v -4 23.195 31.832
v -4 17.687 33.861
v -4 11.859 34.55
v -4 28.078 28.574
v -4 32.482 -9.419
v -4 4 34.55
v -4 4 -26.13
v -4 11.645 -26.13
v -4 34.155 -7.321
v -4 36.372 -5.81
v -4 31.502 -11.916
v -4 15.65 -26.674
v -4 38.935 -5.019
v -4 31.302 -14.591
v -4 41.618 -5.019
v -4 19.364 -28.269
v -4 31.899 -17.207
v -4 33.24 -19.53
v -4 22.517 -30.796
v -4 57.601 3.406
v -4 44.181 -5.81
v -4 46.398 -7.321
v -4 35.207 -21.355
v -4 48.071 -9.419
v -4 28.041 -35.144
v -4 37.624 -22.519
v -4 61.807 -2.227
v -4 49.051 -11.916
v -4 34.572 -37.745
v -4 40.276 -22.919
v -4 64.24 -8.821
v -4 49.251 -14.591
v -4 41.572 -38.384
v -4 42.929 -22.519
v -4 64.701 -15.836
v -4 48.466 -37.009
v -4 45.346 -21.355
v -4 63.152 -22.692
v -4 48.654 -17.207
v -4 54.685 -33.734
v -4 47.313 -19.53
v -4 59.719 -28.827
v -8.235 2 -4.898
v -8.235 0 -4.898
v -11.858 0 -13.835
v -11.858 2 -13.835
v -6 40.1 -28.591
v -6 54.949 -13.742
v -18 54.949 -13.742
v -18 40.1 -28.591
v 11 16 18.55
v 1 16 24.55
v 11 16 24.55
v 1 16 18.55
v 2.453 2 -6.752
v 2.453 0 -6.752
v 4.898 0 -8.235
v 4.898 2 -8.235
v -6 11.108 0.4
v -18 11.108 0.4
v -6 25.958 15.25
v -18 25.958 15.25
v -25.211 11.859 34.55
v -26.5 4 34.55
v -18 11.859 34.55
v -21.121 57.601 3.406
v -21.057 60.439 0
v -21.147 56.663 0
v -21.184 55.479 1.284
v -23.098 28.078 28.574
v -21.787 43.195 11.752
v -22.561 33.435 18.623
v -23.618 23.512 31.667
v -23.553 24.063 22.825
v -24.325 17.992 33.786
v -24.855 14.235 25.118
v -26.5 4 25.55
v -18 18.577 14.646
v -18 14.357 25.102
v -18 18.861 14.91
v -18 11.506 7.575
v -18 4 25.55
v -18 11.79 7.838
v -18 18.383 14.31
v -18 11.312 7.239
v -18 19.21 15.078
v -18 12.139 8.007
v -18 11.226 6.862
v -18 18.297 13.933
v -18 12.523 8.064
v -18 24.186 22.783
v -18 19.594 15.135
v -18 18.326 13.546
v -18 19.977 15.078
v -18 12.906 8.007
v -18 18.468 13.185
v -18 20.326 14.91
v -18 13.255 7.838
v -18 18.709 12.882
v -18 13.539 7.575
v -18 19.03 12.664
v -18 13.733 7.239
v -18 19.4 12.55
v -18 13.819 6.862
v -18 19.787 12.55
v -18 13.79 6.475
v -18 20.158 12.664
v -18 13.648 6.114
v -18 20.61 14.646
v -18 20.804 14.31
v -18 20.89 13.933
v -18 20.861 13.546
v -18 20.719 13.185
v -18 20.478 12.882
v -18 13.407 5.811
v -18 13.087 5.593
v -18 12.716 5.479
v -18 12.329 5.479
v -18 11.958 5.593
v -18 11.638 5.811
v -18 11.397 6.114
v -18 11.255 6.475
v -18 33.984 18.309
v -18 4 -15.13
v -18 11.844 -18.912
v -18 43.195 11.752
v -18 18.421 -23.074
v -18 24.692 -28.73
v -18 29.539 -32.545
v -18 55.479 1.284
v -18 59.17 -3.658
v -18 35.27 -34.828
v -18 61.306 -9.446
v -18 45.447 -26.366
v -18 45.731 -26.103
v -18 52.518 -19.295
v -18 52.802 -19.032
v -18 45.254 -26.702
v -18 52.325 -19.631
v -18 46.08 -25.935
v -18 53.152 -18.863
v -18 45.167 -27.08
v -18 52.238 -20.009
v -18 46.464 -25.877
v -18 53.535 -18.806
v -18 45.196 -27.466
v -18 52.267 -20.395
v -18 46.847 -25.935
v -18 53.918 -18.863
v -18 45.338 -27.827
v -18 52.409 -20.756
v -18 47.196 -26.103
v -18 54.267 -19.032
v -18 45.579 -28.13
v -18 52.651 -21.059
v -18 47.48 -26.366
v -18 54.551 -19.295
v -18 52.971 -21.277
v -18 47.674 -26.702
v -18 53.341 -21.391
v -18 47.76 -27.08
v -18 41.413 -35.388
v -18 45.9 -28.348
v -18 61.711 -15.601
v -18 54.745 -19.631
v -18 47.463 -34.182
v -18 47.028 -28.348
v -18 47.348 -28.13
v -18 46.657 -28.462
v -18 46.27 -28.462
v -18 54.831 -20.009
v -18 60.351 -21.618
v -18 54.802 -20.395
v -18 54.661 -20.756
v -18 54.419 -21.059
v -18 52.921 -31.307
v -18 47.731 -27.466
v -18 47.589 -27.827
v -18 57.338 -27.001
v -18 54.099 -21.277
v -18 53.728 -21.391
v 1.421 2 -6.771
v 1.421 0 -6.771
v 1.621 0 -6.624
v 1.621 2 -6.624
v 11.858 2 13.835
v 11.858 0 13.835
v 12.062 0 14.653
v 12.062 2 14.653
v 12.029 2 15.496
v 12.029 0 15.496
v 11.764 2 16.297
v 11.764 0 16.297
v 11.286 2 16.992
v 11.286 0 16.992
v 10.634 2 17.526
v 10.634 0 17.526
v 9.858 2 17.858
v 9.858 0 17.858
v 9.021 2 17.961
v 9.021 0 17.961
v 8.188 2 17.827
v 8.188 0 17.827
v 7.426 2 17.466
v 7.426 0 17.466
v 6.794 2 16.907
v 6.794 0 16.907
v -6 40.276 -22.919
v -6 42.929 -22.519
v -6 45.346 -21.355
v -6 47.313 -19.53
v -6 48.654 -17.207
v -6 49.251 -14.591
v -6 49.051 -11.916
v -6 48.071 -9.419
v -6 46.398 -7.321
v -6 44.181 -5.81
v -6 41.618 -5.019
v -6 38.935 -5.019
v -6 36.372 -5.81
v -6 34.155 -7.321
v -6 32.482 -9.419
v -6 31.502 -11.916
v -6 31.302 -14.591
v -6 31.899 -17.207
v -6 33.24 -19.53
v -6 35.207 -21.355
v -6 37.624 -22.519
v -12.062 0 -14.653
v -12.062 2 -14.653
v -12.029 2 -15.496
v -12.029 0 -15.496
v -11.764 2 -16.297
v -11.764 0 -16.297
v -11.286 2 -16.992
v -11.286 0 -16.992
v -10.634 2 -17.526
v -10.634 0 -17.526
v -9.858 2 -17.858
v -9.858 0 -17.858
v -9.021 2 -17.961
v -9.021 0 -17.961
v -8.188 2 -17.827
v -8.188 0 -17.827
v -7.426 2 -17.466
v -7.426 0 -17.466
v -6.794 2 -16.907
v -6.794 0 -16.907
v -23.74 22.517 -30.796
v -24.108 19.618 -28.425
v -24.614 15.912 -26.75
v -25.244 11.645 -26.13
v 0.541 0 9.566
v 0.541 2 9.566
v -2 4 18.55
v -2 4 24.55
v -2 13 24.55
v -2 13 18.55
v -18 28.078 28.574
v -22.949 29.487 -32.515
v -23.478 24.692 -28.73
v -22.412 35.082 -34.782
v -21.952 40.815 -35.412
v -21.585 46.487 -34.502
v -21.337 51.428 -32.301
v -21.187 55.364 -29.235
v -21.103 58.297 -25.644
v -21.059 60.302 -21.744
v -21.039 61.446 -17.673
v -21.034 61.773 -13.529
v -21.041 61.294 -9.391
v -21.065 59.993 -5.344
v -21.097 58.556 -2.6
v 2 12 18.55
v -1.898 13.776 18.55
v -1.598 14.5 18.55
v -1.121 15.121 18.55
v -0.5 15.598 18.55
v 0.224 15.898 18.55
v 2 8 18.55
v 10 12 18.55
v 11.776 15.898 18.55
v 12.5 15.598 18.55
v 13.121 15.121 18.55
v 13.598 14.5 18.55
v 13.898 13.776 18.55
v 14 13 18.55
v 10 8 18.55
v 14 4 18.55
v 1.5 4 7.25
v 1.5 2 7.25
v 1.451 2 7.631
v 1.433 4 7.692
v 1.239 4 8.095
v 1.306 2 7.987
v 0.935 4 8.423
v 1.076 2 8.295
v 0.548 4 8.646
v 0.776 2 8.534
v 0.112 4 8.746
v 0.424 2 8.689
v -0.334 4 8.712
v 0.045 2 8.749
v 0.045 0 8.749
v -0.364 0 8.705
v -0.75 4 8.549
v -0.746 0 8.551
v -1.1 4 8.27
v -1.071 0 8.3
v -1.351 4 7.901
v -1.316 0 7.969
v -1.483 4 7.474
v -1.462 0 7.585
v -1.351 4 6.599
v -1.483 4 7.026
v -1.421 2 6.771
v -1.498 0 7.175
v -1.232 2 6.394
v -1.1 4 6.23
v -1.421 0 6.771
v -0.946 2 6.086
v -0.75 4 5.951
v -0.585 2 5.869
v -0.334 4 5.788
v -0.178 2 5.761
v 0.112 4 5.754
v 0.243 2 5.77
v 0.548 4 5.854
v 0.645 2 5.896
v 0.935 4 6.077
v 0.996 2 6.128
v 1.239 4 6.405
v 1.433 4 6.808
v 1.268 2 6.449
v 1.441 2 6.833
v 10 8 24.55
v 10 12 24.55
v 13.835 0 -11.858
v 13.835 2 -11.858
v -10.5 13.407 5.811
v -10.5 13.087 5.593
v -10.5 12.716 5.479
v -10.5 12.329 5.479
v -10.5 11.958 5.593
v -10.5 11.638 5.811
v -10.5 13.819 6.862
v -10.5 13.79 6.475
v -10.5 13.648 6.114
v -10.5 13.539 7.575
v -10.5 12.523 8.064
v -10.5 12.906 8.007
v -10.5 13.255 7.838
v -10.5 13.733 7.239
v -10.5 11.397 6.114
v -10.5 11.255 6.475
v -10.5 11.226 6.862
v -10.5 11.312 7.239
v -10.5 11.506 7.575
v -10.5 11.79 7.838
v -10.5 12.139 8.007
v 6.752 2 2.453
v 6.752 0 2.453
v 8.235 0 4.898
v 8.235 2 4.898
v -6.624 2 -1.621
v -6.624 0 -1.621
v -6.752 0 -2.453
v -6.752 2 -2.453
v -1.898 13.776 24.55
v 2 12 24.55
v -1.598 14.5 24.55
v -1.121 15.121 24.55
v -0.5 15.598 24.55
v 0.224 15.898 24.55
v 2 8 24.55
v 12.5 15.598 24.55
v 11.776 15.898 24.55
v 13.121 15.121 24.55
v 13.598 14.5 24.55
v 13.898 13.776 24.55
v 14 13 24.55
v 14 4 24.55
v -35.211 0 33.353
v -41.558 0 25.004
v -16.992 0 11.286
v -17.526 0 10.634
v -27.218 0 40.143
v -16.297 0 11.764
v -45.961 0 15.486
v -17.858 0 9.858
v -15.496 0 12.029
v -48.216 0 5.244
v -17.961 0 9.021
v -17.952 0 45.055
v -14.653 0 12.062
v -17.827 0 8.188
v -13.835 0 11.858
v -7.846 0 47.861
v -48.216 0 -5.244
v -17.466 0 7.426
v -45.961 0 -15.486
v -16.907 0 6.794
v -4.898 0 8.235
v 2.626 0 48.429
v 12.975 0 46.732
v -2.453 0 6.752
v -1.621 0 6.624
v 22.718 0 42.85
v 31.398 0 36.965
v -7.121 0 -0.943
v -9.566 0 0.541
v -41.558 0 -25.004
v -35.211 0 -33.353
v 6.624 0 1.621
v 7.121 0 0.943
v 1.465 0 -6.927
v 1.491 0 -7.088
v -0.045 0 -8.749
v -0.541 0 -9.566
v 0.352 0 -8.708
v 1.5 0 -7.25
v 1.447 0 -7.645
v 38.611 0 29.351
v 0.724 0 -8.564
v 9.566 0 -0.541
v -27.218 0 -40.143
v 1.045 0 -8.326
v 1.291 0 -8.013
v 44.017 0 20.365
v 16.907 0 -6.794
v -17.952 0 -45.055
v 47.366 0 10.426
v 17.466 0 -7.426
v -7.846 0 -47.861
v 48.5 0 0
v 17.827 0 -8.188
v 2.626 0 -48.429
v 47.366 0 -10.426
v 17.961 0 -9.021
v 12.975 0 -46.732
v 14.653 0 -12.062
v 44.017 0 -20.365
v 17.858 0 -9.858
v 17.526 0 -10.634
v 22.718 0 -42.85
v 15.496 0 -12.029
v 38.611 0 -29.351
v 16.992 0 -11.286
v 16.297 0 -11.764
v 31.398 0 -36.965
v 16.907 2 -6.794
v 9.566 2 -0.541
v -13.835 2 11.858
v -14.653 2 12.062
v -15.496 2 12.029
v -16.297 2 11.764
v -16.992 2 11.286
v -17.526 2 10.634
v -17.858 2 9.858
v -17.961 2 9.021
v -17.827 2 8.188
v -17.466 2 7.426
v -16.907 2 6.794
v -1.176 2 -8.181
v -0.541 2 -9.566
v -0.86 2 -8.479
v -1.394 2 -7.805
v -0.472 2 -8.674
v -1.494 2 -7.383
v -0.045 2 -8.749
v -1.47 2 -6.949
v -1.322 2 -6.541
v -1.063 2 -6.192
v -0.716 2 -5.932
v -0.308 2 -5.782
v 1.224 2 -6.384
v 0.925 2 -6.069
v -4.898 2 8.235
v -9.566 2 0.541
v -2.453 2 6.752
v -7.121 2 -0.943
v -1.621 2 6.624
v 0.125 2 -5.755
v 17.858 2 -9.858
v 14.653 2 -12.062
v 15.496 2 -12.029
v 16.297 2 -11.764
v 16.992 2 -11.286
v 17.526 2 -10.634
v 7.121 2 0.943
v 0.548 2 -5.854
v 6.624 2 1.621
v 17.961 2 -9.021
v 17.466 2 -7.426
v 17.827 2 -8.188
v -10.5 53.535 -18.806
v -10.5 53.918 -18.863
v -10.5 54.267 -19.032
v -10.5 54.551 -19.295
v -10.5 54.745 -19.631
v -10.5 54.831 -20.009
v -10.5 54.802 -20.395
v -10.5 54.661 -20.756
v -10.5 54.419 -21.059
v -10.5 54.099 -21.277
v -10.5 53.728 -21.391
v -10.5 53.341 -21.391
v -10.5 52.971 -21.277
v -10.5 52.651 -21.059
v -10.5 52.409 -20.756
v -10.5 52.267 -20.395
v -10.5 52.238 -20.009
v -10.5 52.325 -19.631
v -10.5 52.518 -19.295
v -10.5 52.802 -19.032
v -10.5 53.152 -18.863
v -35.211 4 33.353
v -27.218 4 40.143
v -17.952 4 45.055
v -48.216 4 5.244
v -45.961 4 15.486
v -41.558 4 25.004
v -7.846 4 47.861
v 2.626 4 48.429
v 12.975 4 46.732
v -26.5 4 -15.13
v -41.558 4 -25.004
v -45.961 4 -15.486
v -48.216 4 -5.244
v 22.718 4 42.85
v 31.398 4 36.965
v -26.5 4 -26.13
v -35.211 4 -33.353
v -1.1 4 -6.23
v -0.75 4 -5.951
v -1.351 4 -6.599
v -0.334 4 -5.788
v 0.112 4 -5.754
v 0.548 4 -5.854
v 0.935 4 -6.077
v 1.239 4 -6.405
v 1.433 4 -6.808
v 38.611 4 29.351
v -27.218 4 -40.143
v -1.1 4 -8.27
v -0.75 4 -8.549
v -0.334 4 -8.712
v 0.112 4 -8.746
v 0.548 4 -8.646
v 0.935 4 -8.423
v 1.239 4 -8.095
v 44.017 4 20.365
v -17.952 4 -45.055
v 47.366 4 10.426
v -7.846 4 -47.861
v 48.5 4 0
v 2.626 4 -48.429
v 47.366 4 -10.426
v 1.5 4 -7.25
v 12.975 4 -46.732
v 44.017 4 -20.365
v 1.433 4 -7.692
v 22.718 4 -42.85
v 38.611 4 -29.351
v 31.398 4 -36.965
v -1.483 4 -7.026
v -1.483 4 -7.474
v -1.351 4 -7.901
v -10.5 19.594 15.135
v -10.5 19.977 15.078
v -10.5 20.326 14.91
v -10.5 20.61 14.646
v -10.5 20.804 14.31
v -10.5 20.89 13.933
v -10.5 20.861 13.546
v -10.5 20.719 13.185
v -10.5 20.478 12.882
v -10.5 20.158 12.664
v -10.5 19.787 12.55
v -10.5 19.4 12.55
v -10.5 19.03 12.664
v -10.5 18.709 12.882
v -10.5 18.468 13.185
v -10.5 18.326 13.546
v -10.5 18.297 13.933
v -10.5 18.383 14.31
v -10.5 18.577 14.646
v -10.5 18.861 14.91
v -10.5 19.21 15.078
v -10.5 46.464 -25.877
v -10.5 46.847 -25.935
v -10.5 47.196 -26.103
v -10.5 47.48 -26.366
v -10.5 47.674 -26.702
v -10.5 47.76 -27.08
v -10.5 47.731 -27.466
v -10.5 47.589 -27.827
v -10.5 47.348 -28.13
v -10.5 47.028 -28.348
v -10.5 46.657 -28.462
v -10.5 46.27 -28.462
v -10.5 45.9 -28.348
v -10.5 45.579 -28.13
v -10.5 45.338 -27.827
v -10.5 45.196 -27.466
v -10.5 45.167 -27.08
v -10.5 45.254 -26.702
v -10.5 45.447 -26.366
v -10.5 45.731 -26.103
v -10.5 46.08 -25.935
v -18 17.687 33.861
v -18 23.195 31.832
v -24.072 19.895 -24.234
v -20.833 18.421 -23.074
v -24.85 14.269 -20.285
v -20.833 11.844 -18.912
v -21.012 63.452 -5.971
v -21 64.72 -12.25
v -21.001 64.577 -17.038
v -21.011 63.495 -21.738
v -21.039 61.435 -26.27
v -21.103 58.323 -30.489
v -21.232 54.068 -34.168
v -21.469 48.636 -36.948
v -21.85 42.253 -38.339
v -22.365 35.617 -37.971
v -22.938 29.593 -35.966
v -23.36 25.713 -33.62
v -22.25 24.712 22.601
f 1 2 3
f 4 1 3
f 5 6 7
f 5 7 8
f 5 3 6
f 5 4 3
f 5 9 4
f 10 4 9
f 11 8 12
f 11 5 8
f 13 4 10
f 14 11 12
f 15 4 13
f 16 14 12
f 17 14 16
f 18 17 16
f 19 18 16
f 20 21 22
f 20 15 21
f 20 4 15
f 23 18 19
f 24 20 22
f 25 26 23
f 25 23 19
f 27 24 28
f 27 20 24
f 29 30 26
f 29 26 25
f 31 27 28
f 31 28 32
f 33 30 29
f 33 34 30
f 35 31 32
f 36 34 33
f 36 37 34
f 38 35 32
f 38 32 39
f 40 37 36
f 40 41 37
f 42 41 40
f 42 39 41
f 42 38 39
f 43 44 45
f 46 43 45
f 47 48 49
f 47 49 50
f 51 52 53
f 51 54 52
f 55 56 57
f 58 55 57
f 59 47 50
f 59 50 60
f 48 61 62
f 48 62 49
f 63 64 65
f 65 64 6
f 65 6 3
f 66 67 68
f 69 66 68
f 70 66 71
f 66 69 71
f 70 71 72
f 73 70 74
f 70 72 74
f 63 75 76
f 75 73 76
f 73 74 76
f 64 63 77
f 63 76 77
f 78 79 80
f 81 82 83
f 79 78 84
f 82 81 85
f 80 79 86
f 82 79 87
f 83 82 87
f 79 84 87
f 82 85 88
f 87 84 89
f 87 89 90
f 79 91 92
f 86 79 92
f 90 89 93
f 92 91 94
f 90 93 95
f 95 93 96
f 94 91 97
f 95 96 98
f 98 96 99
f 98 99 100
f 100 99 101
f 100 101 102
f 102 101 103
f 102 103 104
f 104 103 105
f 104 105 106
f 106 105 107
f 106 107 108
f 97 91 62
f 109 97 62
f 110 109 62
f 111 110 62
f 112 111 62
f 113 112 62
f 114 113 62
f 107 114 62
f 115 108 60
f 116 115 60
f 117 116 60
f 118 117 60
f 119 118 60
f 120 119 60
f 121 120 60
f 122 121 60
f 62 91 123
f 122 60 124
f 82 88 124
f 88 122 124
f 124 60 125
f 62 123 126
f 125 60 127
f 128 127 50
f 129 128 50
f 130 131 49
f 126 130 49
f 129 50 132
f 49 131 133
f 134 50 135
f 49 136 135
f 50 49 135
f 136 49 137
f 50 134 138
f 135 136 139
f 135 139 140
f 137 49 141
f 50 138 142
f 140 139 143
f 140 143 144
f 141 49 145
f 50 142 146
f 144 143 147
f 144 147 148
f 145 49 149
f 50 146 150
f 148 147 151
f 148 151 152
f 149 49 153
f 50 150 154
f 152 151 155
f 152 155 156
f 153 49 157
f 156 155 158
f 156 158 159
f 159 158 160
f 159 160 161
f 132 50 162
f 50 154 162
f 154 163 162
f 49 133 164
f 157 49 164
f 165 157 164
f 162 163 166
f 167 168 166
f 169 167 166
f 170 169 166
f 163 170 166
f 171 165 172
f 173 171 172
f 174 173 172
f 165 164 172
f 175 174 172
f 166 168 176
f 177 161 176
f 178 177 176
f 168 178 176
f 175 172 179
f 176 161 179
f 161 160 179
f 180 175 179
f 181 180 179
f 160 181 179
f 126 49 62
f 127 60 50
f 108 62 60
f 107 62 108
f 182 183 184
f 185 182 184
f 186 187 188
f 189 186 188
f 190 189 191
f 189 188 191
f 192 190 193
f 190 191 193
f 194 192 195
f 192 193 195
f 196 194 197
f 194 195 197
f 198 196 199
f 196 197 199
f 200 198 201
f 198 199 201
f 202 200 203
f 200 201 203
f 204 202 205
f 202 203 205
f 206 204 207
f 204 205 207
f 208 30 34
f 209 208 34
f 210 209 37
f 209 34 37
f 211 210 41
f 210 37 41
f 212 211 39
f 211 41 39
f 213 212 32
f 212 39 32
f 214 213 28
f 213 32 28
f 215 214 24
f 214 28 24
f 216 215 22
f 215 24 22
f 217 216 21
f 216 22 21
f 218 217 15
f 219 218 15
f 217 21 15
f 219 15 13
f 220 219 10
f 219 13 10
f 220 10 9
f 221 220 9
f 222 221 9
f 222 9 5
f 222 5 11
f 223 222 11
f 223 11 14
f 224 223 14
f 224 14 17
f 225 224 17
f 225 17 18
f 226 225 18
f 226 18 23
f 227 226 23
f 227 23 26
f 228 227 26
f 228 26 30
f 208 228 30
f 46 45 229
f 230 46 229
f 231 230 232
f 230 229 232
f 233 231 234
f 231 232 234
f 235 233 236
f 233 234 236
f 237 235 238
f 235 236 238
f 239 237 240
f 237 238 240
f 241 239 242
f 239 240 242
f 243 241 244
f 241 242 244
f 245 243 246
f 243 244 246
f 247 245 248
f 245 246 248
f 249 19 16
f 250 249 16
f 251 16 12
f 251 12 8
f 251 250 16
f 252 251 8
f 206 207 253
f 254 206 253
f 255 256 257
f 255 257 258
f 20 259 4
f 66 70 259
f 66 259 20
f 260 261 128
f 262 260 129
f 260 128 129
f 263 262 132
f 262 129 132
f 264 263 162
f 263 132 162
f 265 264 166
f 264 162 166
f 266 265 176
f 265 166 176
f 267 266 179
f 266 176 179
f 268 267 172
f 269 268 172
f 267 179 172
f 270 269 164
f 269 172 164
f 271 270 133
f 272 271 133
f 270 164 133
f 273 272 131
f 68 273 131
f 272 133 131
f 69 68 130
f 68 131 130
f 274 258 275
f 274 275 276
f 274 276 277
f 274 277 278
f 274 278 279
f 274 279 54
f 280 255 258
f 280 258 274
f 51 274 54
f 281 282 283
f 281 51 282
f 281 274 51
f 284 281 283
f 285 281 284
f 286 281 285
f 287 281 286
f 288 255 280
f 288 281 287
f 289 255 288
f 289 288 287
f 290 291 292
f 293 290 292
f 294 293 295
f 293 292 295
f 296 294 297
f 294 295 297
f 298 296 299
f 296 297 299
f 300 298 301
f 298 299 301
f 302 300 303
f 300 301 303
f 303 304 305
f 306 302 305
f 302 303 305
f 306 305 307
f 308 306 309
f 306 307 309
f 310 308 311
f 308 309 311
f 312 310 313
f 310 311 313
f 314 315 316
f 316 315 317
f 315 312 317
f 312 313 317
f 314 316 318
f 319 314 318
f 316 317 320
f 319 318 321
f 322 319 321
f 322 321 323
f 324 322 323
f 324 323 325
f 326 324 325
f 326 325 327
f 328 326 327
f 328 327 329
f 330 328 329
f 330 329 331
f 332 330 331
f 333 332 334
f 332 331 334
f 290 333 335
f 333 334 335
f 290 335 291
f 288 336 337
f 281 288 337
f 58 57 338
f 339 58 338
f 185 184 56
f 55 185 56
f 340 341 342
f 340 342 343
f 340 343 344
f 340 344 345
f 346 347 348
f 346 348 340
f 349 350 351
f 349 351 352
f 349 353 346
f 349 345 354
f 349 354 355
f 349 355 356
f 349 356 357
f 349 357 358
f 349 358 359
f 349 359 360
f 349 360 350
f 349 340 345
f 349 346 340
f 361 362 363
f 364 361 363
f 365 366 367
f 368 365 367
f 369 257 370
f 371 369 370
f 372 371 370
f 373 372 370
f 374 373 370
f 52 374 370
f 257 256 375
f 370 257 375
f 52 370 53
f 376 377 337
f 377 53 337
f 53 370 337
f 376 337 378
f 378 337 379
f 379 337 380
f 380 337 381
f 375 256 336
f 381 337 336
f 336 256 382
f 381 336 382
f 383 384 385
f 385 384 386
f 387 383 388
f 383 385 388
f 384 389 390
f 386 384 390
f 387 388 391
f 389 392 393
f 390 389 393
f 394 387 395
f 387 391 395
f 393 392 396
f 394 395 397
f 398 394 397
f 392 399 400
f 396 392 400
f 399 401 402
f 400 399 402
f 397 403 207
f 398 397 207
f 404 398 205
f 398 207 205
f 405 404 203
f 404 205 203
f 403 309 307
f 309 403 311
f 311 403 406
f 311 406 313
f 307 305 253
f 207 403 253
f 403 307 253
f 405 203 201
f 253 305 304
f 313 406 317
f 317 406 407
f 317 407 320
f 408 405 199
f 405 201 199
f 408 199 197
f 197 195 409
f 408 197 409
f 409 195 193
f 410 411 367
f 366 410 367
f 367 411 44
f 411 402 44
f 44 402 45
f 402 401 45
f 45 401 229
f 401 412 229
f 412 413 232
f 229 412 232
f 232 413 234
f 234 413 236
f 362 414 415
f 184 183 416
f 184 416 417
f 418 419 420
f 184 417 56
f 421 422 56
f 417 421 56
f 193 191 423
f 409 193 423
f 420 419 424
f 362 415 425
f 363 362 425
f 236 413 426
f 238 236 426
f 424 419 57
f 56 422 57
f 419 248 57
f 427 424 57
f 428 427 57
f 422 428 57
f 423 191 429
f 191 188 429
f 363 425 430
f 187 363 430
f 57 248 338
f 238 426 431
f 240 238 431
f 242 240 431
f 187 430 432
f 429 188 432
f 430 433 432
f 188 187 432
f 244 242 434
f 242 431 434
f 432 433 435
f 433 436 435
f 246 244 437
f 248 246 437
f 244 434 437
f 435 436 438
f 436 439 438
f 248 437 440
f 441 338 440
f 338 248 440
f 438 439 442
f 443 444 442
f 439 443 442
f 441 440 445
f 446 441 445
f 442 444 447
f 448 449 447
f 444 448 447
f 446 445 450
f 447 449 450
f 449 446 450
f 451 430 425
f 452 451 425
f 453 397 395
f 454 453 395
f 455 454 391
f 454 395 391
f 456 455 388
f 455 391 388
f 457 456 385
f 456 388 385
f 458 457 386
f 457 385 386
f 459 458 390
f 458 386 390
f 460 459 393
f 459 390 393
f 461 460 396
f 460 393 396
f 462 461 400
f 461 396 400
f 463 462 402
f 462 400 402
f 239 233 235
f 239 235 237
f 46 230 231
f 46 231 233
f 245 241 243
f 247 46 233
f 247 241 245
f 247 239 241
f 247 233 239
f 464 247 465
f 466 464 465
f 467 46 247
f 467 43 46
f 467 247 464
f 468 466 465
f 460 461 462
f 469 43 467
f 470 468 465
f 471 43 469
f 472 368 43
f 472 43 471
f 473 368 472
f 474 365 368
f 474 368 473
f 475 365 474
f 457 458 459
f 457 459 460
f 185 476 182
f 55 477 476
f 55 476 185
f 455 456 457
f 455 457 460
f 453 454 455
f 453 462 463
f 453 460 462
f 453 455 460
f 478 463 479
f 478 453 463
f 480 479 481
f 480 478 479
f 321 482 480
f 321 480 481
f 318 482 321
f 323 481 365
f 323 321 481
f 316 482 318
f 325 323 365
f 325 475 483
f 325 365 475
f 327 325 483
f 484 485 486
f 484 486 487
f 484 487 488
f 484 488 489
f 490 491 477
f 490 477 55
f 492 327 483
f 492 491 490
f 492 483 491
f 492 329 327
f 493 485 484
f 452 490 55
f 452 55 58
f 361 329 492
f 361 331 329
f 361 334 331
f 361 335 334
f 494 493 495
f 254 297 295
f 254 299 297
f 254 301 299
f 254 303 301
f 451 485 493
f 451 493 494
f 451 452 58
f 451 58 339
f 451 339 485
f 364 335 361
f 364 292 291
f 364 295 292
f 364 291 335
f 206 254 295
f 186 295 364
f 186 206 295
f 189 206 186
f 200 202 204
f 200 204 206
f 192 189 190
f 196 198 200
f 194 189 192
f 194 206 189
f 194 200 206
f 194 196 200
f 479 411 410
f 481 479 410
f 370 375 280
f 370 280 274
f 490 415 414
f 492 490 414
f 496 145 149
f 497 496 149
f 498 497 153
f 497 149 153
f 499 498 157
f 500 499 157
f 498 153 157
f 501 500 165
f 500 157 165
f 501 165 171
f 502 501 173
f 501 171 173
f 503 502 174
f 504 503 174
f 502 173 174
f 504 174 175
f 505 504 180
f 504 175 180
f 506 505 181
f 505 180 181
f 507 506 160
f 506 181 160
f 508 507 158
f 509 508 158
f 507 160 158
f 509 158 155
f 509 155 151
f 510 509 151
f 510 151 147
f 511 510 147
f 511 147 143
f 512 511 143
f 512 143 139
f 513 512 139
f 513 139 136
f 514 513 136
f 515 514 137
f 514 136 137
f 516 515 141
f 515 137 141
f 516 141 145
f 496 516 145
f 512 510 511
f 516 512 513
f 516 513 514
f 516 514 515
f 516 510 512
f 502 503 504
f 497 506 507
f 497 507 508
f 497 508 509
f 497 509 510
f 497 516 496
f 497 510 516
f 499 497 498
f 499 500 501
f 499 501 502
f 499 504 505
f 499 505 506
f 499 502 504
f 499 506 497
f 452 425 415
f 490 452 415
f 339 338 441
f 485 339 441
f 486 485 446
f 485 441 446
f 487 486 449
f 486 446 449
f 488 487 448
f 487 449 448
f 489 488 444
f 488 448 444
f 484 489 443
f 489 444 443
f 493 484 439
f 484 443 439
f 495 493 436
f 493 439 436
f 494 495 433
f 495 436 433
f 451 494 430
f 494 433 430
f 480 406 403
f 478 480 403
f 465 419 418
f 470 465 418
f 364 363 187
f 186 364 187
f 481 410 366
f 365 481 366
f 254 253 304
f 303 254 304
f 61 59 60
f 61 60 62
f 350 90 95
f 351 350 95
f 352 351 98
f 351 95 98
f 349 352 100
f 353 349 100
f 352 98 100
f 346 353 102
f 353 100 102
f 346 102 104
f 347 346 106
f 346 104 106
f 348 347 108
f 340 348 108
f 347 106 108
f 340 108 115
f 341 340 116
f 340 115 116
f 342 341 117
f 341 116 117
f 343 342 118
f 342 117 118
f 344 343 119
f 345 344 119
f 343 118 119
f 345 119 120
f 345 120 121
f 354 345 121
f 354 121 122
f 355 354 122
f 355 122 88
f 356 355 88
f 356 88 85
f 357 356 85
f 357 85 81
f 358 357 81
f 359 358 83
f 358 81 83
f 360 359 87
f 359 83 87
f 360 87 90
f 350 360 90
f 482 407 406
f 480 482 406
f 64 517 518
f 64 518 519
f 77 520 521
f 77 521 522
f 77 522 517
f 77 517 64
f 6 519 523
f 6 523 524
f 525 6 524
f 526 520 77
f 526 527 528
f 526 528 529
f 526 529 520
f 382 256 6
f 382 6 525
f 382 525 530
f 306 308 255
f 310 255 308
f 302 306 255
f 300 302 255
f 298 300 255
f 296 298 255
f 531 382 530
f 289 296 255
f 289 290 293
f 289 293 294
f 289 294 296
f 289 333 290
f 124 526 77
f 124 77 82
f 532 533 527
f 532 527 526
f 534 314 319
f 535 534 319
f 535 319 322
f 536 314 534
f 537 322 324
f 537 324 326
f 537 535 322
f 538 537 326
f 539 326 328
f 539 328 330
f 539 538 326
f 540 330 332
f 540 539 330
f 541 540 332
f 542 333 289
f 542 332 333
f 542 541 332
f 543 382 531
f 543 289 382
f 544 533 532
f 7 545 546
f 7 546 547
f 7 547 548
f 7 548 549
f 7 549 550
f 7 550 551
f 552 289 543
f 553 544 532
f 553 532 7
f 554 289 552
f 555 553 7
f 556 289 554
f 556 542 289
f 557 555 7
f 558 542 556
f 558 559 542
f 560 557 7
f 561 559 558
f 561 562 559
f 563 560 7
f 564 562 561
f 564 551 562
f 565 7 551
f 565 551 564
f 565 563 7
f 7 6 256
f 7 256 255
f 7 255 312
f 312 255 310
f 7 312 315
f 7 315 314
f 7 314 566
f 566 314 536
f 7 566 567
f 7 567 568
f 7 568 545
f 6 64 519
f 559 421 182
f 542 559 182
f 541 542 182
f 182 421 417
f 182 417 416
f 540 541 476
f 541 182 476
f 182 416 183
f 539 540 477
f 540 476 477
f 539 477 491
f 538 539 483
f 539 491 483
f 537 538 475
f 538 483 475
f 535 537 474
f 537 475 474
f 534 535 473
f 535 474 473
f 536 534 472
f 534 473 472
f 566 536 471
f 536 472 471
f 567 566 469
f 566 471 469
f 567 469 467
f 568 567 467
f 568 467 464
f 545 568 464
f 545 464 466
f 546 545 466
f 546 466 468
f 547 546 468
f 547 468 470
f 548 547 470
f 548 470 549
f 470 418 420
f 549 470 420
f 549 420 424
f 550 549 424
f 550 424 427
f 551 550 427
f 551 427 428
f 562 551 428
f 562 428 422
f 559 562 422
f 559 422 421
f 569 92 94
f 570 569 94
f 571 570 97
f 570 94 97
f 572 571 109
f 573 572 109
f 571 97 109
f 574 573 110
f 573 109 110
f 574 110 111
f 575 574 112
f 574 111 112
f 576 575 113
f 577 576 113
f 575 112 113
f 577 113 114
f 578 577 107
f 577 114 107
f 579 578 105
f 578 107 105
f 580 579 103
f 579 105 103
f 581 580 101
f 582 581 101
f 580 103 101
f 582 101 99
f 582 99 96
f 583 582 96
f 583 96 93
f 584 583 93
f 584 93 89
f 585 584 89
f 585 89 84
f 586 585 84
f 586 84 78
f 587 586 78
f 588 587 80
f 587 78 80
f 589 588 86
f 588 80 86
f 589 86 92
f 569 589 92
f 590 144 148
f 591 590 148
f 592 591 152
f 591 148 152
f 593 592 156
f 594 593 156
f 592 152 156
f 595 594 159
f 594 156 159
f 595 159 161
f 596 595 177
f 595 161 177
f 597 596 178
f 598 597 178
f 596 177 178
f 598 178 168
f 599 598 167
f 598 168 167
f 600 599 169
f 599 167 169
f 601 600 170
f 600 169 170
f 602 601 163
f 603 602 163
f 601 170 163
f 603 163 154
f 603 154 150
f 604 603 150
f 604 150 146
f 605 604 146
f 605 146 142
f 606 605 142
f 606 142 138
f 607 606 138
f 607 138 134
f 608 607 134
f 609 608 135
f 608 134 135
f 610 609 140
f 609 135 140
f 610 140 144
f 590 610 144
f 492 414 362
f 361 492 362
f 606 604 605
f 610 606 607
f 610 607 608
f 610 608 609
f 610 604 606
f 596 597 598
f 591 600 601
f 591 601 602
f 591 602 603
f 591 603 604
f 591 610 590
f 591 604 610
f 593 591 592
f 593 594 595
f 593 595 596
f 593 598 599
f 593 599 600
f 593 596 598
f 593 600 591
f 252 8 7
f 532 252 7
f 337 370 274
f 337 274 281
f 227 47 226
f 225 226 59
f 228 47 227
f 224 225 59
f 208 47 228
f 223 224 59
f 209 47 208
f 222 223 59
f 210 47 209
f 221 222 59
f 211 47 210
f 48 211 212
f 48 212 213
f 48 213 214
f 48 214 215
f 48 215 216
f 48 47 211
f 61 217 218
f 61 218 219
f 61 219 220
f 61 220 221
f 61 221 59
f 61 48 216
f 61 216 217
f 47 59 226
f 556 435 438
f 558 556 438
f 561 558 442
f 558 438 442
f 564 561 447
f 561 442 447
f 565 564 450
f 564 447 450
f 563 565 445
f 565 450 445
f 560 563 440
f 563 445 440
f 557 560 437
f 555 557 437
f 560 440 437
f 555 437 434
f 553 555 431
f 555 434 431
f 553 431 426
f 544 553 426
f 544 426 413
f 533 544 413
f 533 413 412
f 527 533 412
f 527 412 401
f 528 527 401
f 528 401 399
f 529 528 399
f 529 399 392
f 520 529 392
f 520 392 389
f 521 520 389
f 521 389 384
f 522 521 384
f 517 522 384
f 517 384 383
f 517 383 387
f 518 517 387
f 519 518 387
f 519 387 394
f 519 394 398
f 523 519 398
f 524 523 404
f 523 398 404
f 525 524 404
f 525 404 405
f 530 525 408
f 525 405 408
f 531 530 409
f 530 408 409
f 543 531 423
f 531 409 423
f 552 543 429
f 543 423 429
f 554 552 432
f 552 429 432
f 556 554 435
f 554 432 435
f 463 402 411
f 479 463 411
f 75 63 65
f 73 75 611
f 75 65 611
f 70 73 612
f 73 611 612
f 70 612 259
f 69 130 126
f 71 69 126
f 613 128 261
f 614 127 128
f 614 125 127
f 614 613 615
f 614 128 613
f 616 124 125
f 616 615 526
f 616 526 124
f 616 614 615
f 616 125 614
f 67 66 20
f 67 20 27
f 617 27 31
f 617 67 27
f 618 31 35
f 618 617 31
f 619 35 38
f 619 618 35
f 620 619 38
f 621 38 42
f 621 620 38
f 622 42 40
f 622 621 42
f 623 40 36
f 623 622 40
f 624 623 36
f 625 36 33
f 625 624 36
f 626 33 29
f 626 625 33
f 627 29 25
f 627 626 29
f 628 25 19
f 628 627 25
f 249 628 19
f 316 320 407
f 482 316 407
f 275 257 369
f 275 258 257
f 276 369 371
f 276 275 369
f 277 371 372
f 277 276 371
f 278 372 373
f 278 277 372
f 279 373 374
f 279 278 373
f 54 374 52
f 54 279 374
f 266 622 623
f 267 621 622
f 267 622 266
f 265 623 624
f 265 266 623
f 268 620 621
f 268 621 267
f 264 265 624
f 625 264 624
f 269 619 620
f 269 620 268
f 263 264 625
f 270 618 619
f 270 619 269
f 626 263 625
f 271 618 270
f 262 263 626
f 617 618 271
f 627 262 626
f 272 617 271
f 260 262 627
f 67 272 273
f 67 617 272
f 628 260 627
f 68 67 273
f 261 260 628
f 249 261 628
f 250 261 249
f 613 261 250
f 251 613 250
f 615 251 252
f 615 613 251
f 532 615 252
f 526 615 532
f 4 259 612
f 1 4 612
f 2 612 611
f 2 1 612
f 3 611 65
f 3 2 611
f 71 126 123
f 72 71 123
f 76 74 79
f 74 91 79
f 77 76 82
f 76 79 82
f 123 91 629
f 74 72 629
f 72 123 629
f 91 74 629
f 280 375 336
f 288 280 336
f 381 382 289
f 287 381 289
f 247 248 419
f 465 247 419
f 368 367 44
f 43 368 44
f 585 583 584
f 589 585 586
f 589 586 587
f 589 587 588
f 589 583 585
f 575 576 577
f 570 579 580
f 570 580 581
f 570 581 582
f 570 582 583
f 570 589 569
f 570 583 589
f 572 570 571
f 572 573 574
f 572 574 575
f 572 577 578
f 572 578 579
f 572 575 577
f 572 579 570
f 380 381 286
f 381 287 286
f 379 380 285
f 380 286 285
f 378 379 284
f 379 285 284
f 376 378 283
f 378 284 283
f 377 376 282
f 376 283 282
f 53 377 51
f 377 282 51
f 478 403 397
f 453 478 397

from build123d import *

# Parameters (mm, degrees)
SKETCH2_R                = 48.5
BOSS_EXTRUDE1_DEPTH      = 4
SKETCH4_R                = 1.5
CUT_EXTRUDE2_DEPTH       = 5
SKETCH5_R                = 3.75
CUT_EXTRUDE3_DEPTH       = 1.5
BOSS_EXTRUDE2_DEPTH      = 14
CUT_EXTRUDE5_REACH       = 44.5
SKETCH9_R                = 1.3
CUT_EXTRUDE6_DEPTH       = 7.5
CUT_EXTRUDE9_REACH       = 46.5
SKETCH11_R               = 9
BOSS_EXTRUDE7_DEPTH      = 9
BOSS_EXTRUDE7_DEPTH_BACK = 14
BOSS_EXTRUDE10_DEPTH     = 9
SKETCH27_W               = 16
SKETCH27_H               = 6
BOSS_EXTRUDE11_DEPTH     = 12
FILLET6_R                = 3
CUT_EXTRUDE16_REACH      = 75.05
SKETCH28_W               = 8
SKETCH28_H               = 4
CUT_EXTRUDE17_DEPTH      = 49.5
CUT_EXTRUDE17_DEPTH_BACK = 49.5
CUT_EXTRUDE19_DEPTH      = 2


with BuildPart() as part:
    # Sketch2 → Boss-Extrude1 (new body)
    with BuildSketch(Plane(origin=(0, 0, 0), x_dir=(1, 0, 0), z_dir=(0, 1, 0))):
        Circle(SKETCH2_R)
    extrude(amount=BOSS_EXTRUDE1_DEPTH)

    # Sketch4 → Cut-Extrude2 (cut, through all)
    with BuildSketch(Plane.XZ):
        with Locations((0, 7.25)):
            Circle(SKETCH4_R)
        with Locations((0, -7.25)):
            Circle(SKETCH4_R)
    extrude(amount=-CUT_EXTRUDE2_DEPTH, mode=Mode.SUBTRACT)

    # Sketch5 → Cut-Extrude3 (cut)
    with BuildSketch(Plane.XZ):
        Circle(SKETCH5_R)
    extrude(amount=-CUT_EXTRUDE3_DEPTH, mode=Mode.SUBTRACT)

    # Sketch7 → Boss-Extrude2 (add)
    with BuildSketch(Plane(origin=(-4, 0, 0), x_dir=(0, 0, -1), z_dir=(1, 0, 0))):
        with BuildLine():
            Line((23.129947874, 4), (23.129947874, 11.644549616))
            ThreePointArc((23.129947874, 11.644549616), (24.589048403, 18.743749901), (28.729797284, 24.692011643))
            ThreePointArc((28.729797284, 24.692011643), (29.313383054, 55.284736897), (-1.284289494, 55.479275971))
            Line((-1.284289494, 55.479275971), (-27.227315747, 29.536249718))
            ThreePointArc((-27.227315747, 29.536249718), (-32.64663453, 21.425665997), (-34.549646217, 11.858580188))
            Line((-34.549646217, 11.858580188), (-34.549646217, 4))
            Line((-34.549646217, 4), (23.129947874, 4))
        make_face()
    extrude(amount=-BOSS_EXTRUDE2_DEPTH)

    # Sketch8 → Cut-Extrude5 (cut, up to next)
    with BuildSketch(Plane(origin=(-6, 0, 0), x_dir=(0, 0, -1), z_dir=(1, 0, 0)), mode=Mode.PRIVATE) as cut_extrude5_sk1:
        Polygon((-15.249648422, 25.957567857), (13.741729607, 54.948945886), (28.590972012, 40.099703481), (-0.400406017, 11.108325452), align=None)
    cut_extrude5_tool1 = extrude(cut_extrude5_sk1.sketch, amount=-CUT_EXTRUDE5_REACH, mode=Mode.PRIVATE) & part.part
    add(cut_extrude5_tool1.solids().sort_by_distance((-6, 33.028636, -6.670662))[0], mode=Mode.SUBTRACT)

    # Sketch9 → Cut-Extrude6 (cut)
    with BuildSketch(Plane.ZY.offset(18)):
        with Locations((-20.105690637, 53.534732323)):
            Circle(SKETCH9_R)
        with Locations((-27.176758449, 46.463664511)):
            Circle(SKETCH9_R)
        with Locations((6.764367048, 12.522539014)):
            Circle(SKETCH9_R)
        with Locations((13.83543486, 19.593606826)):
            Circle(SKETCH9_R)
    extrude(amount=-CUT_EXTRUDE6_DEPTH, mode=Mode.SUBTRACT)

    # Sketch11 → Cut-Extrude9 (cut, up to next)
    with BuildSketch(Plane(origin=(-4, 0, 0), x_dir=(0, 0, -1), z_dir=(1, 0, 0)), mode=Mode.PRIVATE) as cut_extrude9_sk1:
        with Locations((13.918506302, 40.276480176)):
            Circle(SKETCH11_R)
    cut_extrude9_tool1 = extrude(cut_extrude9_sk1.sketch, amount=-CUT_EXTRUDE9_REACH, mode=Mode.PRIVATE) & part.part
    add(cut_extrude9_tool1.solids().sort_by_distance((-4, 40.27648, -13.918506))[0], mode=Mode.SUBTRACT)

    # Sketch17 → Boss-Extrude7 (add, two sides)
    with BuildSketch(Plane.ZY.offset(18)) as boss_extrude7_sk:
        with BuildLine():
            ThreePointArc((34.549646217, 11.858580188), (33.008342843, 20.500891953), (28.574482006, 28.077569775))
            ThreePointArc((28.574482006, 28.077569775), (27.915386359, 28.820289685), (27.227315747, 29.536249718))
            Line((27.227315747, 29.536249718), (1.284289494, 55.479275971))
            Line((1.284289494, 55.479275971), (26.295003593, 26.127182305))
            ThreePointArc((26.295003593, 26.127182305), (30.194232218, 19.461281607), (31.549646217, 11.858580188))
            Line((31.549646217, 11.858580188), (31.549646217, 4))
            Line((31.549646217, 4), (34.549646217, 4))
            Line((34.549646217, 4), (34.549646217, 11.858580188))
        make_face()
        with BuildLine():
            Line((28.574482006, 28.077569775), (3.405609837, 57.600596315))
            ThreePointArc((3.405609837, 57.600596315), (-31.461505391, 57.378912253), (-30.796489049, 22.517434639))
            ThreePointArc((-30.796489049, 22.517434639), (-27.345864981, 17.560549854), (-26.129947874, 11.644549616))
            Line((-26.129947874, 11.644549616), (-26.129947874, 4))
            Line((-26.129947874, 4), (-23.129947874, 4))
            Line((-23.129947874, 4), (-23.129947874, 11.644549616))
            ThreePointArc((-23.129947874, 11.644549616), (-24.589048403, 18.743749901), (-28.729797284, 24.692011643))
            ThreePointArc((-28.729797284, 24.692011643), (-29.313383054, 55.284736897), (1.284289494, 55.479275971))
            Line((1.284289494, 55.479275971), (27.227315747, 29.536249718))
            ThreePointArc((27.227315747, 29.536249718), (27.915386359, 28.820289685), (28.574482006, 28.077569775))
        make_face()
    extrude(amount=BOSS_EXTRUDE7_DEPTH)
    extrude(boss_extrude7_sk.sketch, amount=-BOSS_EXTRUDE7_DEPTH_BACK)

    # Sketch25 → Boss-Extrude10 (add)
    with BuildSketch(Plane.ZY.offset(18)):
        with BuildLine():
            ThreePointArc((-28.729797284, 24.692011643), (-24.589048403, 18.743749901), (-23.129947874, 11.644549616))
            Line((-23.129947874, 11.644549616), (-23.129947874, 4))
            Line((-23.129947874, 4), (-15.129947874, 4))
            add(Edge.make_bspline(
                [(-28.729797284, 24.692011643), (-21.954867515, 18.253200081), (-19.09405247, 12.798017691), (-15.129947874, 4)],
                knots=[0, 0, 0, 0, 1, 1, 1, 1], degree=3))
        make_face()
        with BuildLine():
            add(Edge.make_bspline(
                [(11.751619577, 43.19501844), (26.551255916, 25.8264495), (25.549646217, 4)],
                knots=[0, 0, 0, 1, 1, 1], degree=2))
            Line((25.549646217, 4), (31.549646217, 4))
            Line((31.549646217, 4), (31.549646217, 11.858580188))
            ThreePointArc((31.549646217, 11.858580188), (30.194232218, 19.461281607), (26.295003593, 26.127182305))
            Line((26.295003593, 26.127182305), (11.751619577, 43.19501844))
        make_face()
    extrude(amount=BOSS_EXTRUDE10_DEPTH)

    # Sketch27 → Boss-Extrude11 (add)
    with BuildSketch(Plane(origin=(0, 4, 0), x_dir=(1, 0, 0), z_dir=(0, 1, 0))):
        with Locations((6, -21.549646217)):
            Rectangle(SKETCH27_W, SKETCH27_H)
    extrude(amount=BOSS_EXTRUDE11_DEPTH)

    # Fillet6
    fillet6_edges = [part.edges().sort_by_distance(p)[0] for p in [
        (-2, 16, 21.549646217),
        (14, 16, 21.549646217),
    ]]
    fillet(fillet6_edges, radius=FILLET6_R)

    # Sketch28 → Cut-Extrude16 (cut, up to next)
    with BuildSketch(Plane.XY.offset(24.549646217), mode=Mode.PRIVATE) as cut_extrude16_sk1:
        with Locations((6, 10)):
            Rectangle(SKETCH28_W, SKETCH28_H)
    cut_extrude16_tool1 = extrude(cut_extrude16_sk1.sketch, amount=-CUT_EXTRUDE16_REACH, mode=Mode.PRIVATE) & part.part
    add(cut_extrude16_tool1.solids().sort_by_distance((6, 10, 24.549646))[0], mode=Mode.SUBTRACT)

    # Sketch29 → Cut-Extrude17 (cut, two sides)
    with BuildSketch(Plane.XY) as cut_extrude17_sk:
        with BuildLine():
            Line((-21, 64.776480176), (-27, 64.776480176))
            Line((-27, 64.776480176), (-27, 4))
            Line((-27, 4), (-26.5, 4))
            add(Edge.make_bspline(
                [(-21, 64.776480176), (-21.220459696, 34.140901434), (-26.5, 4)],
                knots=[0, 0, 0, 1, 1, 1], degree=2))
        make_face()
    extrude(amount=CUT_EXTRUDE17_DEPTH, mode=Mode.SUBTRACT)
    extrude(cut_extrude17_sk.sketch, amount=-CUT_EXTRUDE17_DEPTH_BACK, mode=Mode.SUBTRACT)

    # Sketch30 → Cut-Extrude19 (cut)
    with BuildSketch(Plane.XZ):
        with BuildLine():
            Line((-1.621331548, 6.623828248), (-2.453034191, 6.751779974))
            Line((-2.453034191, 6.751779974), (-4.898074614, 8.235232927))
            Line((-4.898074614, 8.235232927), (-13.834583132, 11.85774614))
            ThreePointArc((-13.834583132, 11.85774614), (-17.526437212, 10.633625847), (-16.906999469, 6.793762058))
            Line((-16.906999469, 6.793762058), (-9.566495717, 0.540699516))
            Line((-9.566495717, 0.540699516), (-7.121455294, -0.942753437))
            Line((-7.121455294, -0.942753437), (-6.623828248, -1.621331548))
            Line((-6.623828248, -1.621331548), (-6.751779974, -2.453034191))
            Line((-6.751779974, -2.453034191), (-8.235232927, -4.898074614))
            Line((-8.235232927, -4.898074614), (-11.85774614, -13.834583132))
            ThreePointArc((-11.85774614, -13.834583132), (-10.633625847, -17.526437212), (-6.793762058, -16.906999469))
            Line((-6.793762058, -16.906999469), (-0.540699516, -9.566495717))
            Line((-0.540699516, -9.566495717), (0.942753437, -7.121455294))
            Line((0.942753437, -7.121455294), (1.621331548, -6.623828248))
            Line((1.621331548, -6.623828248), (2.453034191, -6.751779974))
            Line((2.453034191, -6.751779974), (4.898074614, -8.235232927))
            Line((4.898074614, -8.235232927), (13.834583132, -11.85774614))
            ThreePointArc((13.834583132, -11.85774614), (17.526437212, -10.633625847), (16.906999469, -6.793762058))
            Line((16.906999469, -6.793762058), (9.566495717, -0.540699516))
            Line((9.566495717, -0.540699516), (7.121455294, 0.942753437))
            Line((7.121455294, 0.942753437), (6.623828248, 1.621331548))
            Line((6.623828248, 1.621331548), (6.751779974, 2.453034191))
            Line((6.751779974, 2.453034191), (8.235232927, 4.898074614))
            Line((8.235232927, 4.898074614), (11.85774614, 13.834583132))
            ThreePointArc((11.85774614, 13.834583132), (10.633625847, 17.526437212), (6.793762058, 16.906999469))
            Line((6.793762058, 16.906999469), (0.540699516, 9.566495717))
            Line((0.540699516, 9.566495717), (-0.942753437, 7.121455294))
            Line((-0.942753437, 7.121455294), (-1.621331548, 6.623828248))
        make_face()
    extrude(amount=-CUT_EXTRUDE19_DEPTH, mode=Mode.SUBTRACT)


solid = part.part
